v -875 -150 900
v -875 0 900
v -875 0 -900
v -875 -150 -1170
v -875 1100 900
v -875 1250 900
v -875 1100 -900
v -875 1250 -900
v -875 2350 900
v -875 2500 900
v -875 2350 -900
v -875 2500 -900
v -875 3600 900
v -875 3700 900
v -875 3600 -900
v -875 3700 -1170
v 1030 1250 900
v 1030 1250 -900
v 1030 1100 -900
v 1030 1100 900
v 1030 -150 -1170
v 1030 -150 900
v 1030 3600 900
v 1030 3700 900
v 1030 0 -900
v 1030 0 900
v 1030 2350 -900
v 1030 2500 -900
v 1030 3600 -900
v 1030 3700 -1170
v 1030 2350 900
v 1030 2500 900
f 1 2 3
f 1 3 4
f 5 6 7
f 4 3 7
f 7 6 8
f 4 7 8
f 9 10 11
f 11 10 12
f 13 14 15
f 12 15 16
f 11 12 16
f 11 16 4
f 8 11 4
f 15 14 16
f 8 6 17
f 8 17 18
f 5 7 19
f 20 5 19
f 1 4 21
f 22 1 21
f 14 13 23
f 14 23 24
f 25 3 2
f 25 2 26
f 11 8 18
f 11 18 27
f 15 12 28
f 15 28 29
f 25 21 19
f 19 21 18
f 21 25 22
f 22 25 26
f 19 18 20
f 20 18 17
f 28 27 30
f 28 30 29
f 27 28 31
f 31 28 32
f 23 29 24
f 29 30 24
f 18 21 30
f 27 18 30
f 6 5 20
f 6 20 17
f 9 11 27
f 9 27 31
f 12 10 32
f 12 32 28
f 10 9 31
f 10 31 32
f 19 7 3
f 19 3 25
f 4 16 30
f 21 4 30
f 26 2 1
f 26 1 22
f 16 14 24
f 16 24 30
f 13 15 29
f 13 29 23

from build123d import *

# Parameters (mm, degrees)
SKETCH_1_W          = 1750
SKETCH_1_H          = 1800
EXTRUDE_3_DEPTH     = 150
SKETCH_2_W          = 1750
SKETCH_2_H          = 1800
EXTRUDE_5_DEPTH     = 150
SKETCH_3_W          = 1750
SKETCH_3_H          = 1800
EXTRUDE_6_DEPTH     = 150
SKETCH_7_W          = 1750
SKETCH_7_H          = 1800
EXTRUDE_10_DEPTH    = 100
SKETCH_4_W          = 1750
SKETCH_4_H          = 270
EXTRUDE_11_DEPTH    = 3700
SKETCH_8_W          = 1750
SKETCH_8_H          = 3550
CUT_EXTRUDE_1_DEPTH = 7400
EXTRUDE_13_DEPTH    = 1030


with BuildPart() as part:
    # 草图1 → 凸台-拉伸3 (new body)
    with BuildSketch(Plane(origin=(0, 0, 0), x_dir=(1, 0, 0), z_dir=(0, 1, 0))):
        Rectangle(SKETCH_1_W, SKETCH_1_H)
    extrude(amount=-EXTRUDE_3_DEPTH)



with BuildPart() as body_2:
    # 草图2 → 凸台-拉伸5 (new body)
    with BuildSketch(Plane(origin=(0, 1250, 0), x_dir=(1, 0, 0), z_dir=(0, 1, 0))):
        Rectangle(SKETCH_2_W, SKETCH_2_H)
    extrude(amount=-EXTRUDE_5_DEPTH)


with BuildPart() as body_3:
    # 草图3 → 凸台-拉伸6 (new body)
    with BuildSketch(Plane(origin=(0, 2500, 0), x_dir=(1, 0, 0), z_dir=(0, 1, 0))):
        Rectangle(SKETCH_3_W, SKETCH_3_H)
    extrude(amount=-EXTRUDE_6_DEPTH)


with BuildPart() as body_4:
    # 草图7 → 凸台-拉伸10 (new body)
    with BuildSketch(Plane(origin=(0, 3600, 0), x_dir=(1, 0, 0), z_dir=(0, 1, 0))):
        Rectangle(SKETCH_7_W, SKETCH_7_H)
    extrude(amount=EXTRUDE_10_DEPTH)


with BuildPart() as part_1:
    add(part.part)

    add(body_2.part)  # 凸台-拉伸11 merges body 2

    add(body_3.part)  # 凸台-拉伸11 merges body 3

    add(body_4.part)  # 凸台-拉伸11 merges body 4
    # 草图4 → 凸台-拉伸11 (add, symmetric)
    with BuildSketch(Plane(origin=(0, 0, 0), x_dir=(1, 0, 0), z_dir=(0, 1, 0))):
        with Locations((0, 1035)):
            Rectangle(SKETCH_4_W, SKETCH_4_H)
    extrude(amount=EXTRUDE_11_DEPTH, both=True)

    # 草图8 → 切除-拉伸1 (cut)
    with BuildSketch(Plane.XY):
        with Locations((0, -1925)):
            Rectangle(SKETCH_8_W, SKETCH_8_H)
    extrude(amount=-CUT_EXTRUDE_1_DEPTH, mode=Mode.SUBTRACT)

    # 草图9 → 凸台-拉伸13 (add)
    with BuildSketch(Plane(origin=(0, 0, 0), x_dir=(0, 0, -1), z_dir=(1, 0, 0))):
        Polygon((-900, 3700), (1170, 3700), (1170, -150), (-900, -150), (-900, 0), (900, 0), (900, 1100), (-900, 1100), (-900, 1250), (900, 1250), (900, 2350), (-900, 2350), (-900, 2500), (900, 2500), (900, 3600), (-900, 3600), align=None)
    extrude(amount=EXTRUDE_13_DEPTH)


solid = part_1.part
